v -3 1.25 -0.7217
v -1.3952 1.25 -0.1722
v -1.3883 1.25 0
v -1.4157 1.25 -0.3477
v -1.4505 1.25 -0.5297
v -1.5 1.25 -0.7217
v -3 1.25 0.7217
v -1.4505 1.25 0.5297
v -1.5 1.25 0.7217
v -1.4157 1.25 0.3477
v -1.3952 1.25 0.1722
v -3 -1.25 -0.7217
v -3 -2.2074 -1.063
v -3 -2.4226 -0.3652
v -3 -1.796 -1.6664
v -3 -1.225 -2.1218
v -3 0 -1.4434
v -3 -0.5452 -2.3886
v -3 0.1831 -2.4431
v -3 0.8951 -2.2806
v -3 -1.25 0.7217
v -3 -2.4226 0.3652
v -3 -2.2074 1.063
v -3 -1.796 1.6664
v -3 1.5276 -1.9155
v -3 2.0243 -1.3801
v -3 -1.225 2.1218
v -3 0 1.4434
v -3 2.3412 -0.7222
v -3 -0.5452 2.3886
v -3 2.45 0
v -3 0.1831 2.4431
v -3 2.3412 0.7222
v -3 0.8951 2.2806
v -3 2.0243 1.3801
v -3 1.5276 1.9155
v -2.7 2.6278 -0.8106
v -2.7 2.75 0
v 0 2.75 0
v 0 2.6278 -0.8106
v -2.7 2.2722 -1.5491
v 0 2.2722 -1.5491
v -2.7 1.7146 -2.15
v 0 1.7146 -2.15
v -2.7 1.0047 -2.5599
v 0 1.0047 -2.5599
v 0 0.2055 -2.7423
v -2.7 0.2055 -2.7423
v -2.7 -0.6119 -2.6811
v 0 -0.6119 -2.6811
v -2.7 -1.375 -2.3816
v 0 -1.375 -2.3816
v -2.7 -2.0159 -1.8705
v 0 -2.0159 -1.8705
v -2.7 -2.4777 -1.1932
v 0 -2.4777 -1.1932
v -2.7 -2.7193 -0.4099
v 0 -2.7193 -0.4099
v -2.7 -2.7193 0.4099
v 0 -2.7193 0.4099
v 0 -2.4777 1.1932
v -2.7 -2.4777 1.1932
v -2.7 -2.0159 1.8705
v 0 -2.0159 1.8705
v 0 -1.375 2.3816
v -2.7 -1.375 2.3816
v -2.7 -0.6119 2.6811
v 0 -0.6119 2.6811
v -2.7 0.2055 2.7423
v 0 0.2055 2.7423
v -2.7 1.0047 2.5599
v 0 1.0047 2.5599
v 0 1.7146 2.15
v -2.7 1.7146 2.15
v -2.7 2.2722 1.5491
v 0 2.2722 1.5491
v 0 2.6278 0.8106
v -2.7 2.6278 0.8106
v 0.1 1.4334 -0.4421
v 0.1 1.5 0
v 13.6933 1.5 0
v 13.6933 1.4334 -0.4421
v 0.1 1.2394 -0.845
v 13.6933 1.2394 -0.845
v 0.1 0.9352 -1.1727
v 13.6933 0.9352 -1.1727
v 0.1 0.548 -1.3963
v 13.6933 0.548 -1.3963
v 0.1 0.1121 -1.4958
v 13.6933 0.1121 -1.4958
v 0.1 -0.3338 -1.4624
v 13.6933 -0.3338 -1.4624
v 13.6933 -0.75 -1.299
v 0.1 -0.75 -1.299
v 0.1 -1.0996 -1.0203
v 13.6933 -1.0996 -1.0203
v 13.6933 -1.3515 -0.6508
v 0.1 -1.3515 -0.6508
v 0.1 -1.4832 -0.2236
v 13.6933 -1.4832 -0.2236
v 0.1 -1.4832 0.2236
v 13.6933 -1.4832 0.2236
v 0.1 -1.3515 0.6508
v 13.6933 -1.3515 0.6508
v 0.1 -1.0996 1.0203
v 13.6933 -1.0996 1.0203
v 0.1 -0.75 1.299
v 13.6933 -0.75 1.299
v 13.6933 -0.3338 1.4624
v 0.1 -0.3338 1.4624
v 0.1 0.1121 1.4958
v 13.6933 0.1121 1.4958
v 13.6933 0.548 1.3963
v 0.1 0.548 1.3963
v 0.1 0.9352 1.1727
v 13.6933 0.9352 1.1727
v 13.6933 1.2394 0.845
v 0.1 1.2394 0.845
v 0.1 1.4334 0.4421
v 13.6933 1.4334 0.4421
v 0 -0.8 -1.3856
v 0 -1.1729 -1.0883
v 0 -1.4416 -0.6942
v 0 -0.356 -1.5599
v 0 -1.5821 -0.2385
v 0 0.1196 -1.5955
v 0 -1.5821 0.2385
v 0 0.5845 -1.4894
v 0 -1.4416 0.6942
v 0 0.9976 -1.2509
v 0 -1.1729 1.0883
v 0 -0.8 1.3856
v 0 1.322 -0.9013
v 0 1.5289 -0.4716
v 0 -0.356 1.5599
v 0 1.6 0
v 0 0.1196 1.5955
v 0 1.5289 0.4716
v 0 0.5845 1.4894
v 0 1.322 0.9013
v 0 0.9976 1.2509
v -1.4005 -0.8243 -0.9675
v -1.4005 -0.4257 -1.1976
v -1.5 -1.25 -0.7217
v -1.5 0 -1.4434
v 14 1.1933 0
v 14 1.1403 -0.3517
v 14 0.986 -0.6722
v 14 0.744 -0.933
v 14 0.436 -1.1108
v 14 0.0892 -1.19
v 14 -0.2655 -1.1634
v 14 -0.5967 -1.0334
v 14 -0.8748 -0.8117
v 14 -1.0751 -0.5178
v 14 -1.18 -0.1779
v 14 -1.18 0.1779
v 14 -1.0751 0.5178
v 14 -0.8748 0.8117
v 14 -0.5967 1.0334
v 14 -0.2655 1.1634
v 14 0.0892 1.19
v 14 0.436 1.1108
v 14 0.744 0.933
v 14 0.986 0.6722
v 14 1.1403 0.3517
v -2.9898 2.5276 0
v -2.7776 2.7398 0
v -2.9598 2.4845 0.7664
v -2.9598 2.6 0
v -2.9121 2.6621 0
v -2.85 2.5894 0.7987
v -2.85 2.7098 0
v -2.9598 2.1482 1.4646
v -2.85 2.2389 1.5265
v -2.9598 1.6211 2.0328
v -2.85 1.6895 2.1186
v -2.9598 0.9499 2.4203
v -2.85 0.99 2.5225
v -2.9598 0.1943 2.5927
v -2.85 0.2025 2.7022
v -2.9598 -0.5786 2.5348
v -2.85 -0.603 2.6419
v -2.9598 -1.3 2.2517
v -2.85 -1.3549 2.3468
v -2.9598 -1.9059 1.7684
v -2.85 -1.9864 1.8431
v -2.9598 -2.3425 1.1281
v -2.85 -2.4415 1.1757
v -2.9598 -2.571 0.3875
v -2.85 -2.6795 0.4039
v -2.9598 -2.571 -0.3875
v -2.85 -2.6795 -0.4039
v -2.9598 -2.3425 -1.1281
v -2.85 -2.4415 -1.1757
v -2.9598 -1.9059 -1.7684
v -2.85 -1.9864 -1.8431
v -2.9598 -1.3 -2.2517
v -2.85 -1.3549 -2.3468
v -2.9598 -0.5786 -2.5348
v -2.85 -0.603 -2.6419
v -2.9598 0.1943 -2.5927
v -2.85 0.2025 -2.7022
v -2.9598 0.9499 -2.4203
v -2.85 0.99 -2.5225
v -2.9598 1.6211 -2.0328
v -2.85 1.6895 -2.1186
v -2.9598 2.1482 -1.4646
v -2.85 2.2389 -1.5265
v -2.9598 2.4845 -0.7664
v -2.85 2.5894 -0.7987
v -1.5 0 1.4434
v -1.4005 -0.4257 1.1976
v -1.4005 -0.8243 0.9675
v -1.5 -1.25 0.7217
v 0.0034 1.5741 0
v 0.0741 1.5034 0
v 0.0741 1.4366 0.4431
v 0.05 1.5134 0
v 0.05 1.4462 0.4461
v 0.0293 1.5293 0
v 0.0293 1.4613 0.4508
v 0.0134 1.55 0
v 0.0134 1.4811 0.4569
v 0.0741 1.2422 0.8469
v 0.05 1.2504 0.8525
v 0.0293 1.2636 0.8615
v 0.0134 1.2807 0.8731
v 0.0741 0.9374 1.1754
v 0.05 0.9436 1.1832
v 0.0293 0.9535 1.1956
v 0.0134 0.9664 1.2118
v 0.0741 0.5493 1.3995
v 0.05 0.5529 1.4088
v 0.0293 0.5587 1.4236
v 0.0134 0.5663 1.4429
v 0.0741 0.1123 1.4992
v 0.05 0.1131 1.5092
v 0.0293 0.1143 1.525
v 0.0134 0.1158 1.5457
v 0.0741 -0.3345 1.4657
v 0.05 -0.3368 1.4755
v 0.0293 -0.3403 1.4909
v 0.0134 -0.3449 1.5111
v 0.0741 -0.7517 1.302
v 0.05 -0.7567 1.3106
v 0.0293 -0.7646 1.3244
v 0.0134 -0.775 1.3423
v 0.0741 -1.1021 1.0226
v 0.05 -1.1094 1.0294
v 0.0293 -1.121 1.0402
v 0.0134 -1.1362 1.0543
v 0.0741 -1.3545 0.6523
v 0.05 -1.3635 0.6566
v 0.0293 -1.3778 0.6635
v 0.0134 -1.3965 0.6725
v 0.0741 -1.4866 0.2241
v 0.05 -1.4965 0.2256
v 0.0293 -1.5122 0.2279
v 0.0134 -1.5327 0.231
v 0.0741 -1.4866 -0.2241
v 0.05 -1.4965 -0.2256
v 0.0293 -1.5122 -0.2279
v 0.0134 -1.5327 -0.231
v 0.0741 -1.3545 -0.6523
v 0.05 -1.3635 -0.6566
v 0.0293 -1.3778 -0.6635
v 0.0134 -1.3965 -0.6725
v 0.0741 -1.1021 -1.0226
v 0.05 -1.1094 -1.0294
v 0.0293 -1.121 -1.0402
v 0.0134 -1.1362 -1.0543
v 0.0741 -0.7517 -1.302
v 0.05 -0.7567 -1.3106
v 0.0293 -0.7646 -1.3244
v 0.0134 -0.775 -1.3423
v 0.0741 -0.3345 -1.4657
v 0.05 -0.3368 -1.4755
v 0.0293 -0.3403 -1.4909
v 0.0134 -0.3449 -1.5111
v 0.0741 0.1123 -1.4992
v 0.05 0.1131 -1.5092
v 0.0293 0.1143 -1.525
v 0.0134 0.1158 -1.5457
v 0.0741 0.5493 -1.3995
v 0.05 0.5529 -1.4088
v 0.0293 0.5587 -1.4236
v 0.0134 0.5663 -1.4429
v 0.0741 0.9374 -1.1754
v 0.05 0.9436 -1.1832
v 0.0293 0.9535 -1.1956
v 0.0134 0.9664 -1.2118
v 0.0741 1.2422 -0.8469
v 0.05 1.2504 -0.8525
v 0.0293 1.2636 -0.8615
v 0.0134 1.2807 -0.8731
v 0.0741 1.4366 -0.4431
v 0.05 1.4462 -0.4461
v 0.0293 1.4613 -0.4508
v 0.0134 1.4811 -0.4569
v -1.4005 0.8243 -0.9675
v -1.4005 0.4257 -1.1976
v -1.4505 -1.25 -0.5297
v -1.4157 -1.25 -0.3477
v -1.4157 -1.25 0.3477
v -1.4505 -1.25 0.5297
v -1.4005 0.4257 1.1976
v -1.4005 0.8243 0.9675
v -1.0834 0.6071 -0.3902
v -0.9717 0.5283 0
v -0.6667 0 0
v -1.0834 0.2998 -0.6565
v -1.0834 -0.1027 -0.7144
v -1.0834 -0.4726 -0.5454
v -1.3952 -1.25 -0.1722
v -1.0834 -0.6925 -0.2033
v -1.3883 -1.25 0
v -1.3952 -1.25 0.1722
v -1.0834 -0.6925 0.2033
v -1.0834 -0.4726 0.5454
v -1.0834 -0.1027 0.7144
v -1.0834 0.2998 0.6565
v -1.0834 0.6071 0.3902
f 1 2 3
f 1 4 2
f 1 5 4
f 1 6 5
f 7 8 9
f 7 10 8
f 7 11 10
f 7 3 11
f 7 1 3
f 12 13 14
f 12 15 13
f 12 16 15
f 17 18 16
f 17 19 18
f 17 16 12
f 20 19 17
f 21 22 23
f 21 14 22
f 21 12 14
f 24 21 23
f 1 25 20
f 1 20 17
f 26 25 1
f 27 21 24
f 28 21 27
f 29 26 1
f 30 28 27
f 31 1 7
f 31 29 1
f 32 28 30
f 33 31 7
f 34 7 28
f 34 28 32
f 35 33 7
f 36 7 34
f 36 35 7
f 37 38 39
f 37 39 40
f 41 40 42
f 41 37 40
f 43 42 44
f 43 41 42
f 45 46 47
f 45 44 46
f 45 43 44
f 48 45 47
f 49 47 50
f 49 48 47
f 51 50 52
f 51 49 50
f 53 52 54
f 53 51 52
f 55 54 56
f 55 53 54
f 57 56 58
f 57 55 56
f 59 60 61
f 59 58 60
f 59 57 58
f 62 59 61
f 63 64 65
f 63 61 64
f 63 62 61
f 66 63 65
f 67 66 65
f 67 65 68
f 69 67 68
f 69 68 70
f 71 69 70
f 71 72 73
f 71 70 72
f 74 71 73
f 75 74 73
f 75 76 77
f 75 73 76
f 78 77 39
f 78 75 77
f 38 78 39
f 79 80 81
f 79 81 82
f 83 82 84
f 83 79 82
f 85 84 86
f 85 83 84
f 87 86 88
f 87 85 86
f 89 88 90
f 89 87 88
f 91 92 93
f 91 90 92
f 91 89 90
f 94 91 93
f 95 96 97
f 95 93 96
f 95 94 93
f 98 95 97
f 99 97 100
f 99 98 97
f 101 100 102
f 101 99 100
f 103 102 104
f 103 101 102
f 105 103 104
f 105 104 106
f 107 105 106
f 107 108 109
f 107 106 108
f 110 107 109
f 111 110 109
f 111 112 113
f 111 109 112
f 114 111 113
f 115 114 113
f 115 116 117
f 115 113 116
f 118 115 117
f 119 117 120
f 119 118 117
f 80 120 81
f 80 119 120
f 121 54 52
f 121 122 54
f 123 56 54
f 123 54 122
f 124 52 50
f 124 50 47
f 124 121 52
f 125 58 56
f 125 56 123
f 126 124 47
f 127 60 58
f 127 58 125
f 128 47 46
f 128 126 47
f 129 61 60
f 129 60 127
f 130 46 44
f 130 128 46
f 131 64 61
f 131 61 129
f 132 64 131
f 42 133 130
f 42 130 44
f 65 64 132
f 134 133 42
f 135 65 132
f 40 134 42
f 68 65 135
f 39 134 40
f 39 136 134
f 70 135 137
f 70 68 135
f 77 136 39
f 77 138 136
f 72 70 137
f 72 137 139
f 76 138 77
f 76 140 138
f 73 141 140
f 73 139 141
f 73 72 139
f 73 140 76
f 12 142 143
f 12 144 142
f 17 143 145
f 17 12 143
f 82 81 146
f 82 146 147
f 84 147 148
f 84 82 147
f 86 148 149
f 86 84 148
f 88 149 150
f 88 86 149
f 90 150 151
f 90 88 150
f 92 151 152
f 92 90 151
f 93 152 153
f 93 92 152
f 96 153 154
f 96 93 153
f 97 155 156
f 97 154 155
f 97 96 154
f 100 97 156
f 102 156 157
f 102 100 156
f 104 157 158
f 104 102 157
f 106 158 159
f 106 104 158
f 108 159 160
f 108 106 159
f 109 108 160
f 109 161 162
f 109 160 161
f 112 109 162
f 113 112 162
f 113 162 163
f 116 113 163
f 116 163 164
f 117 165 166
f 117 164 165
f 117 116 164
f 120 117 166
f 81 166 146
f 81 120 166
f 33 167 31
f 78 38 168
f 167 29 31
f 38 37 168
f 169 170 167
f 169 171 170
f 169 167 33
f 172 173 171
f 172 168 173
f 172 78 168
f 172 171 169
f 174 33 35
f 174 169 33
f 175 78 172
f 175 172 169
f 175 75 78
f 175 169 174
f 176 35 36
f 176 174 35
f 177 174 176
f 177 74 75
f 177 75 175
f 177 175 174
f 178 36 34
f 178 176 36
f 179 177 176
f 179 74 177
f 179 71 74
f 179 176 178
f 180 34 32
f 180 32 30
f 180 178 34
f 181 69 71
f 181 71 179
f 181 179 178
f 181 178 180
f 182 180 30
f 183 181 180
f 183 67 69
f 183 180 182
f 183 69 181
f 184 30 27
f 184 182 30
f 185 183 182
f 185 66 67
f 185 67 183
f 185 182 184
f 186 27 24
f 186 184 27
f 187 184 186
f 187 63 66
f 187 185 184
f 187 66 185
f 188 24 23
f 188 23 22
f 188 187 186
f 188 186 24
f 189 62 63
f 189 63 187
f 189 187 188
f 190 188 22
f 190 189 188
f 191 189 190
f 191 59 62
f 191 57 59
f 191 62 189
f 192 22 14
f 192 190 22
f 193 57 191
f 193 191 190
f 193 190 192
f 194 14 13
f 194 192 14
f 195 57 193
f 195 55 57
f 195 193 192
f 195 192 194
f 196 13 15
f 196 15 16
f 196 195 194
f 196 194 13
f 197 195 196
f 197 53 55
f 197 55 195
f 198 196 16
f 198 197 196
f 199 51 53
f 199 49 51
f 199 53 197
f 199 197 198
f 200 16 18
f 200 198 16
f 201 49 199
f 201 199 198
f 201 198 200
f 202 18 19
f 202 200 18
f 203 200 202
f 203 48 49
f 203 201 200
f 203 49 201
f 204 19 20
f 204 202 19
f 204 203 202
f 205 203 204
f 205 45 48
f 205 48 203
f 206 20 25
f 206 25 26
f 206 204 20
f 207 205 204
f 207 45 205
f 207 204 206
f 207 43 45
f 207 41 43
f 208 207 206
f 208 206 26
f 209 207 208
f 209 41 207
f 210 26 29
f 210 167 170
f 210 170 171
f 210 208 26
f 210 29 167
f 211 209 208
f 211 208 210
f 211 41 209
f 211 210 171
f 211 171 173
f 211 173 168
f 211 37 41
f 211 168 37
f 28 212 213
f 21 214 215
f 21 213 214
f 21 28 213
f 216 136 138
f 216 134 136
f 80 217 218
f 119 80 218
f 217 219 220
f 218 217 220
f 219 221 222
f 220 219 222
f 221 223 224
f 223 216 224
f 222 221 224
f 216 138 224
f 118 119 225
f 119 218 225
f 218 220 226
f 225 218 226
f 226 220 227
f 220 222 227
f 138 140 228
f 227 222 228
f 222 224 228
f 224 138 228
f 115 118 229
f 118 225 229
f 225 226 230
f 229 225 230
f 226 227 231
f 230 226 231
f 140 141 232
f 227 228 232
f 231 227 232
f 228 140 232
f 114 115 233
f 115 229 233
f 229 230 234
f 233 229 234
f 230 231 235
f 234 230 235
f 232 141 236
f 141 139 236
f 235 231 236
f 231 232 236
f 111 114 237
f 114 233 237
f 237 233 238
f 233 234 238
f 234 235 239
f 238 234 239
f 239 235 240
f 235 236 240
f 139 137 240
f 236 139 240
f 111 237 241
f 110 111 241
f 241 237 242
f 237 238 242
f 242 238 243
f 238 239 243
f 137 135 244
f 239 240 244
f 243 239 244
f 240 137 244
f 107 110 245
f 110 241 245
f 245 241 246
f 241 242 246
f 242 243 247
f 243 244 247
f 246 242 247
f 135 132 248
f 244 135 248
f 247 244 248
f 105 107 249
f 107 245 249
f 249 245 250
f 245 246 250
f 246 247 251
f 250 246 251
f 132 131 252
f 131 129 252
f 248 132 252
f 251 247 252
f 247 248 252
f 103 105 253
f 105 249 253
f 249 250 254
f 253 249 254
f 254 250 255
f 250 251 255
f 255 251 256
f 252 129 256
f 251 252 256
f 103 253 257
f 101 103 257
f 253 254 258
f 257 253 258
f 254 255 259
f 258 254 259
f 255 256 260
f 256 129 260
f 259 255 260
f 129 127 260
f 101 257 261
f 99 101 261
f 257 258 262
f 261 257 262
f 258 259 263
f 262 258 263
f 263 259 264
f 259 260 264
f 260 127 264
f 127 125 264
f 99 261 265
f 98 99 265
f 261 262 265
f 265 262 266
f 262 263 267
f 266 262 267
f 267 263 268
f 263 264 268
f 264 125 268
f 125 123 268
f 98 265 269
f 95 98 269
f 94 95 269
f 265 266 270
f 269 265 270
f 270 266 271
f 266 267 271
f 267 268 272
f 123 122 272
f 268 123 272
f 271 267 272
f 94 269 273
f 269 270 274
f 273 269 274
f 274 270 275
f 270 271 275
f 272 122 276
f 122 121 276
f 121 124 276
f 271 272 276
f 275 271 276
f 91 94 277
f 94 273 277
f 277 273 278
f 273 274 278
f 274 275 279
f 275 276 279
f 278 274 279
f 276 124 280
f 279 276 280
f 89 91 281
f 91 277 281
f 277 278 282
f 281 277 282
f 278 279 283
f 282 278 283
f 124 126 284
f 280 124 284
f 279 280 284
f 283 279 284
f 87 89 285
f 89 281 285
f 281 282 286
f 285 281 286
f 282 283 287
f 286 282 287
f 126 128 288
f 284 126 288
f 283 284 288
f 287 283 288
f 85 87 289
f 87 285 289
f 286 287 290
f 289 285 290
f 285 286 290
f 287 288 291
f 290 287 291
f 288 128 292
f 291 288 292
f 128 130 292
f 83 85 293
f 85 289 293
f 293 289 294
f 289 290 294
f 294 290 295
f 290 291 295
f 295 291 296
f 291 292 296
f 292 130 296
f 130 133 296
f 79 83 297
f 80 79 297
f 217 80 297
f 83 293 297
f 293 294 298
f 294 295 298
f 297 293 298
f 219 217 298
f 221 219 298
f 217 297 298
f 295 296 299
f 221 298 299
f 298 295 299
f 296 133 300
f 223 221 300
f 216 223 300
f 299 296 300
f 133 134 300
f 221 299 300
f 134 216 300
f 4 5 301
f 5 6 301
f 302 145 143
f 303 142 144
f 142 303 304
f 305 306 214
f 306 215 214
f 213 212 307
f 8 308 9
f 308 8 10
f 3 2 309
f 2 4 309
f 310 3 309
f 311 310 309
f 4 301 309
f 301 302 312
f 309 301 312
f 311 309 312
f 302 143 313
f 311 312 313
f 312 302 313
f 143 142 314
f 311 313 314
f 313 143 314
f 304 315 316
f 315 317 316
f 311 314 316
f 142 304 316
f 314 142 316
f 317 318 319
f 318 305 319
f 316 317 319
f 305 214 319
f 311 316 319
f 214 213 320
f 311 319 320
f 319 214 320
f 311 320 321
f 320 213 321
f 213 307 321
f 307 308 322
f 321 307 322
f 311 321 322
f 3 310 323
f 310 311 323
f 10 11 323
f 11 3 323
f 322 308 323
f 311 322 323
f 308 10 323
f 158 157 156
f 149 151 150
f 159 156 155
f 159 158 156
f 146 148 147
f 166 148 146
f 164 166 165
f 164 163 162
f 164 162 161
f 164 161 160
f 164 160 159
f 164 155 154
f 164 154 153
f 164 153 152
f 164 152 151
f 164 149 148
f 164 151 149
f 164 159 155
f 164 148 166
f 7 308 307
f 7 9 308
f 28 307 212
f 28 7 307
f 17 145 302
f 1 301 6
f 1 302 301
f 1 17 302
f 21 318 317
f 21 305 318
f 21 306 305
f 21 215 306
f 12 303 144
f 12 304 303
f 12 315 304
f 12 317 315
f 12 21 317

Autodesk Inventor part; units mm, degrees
ref_plane "YZ Plane" through (0, 0, 0) normal (1, 0, 0) x (0, 1, 0)
ref_plane "XZ Plane" through (0, 0, 0) normal (0, 1, 0) x (-1, 0, 0)
sketch "Sketch1" plane through (0, 0, 0) normal (0, 0, 1) x (1, 0, 0)
  line L0 (-0.6667, 0) -> (14, 0)
  line L1 (14, 0) -> (14, 1.5)
  line L2 (14, 1.5) -> (1, 1.5)
  line L3 (1, 1.5) -> (0.6932, 1.5)
  line L4 (0.6932, 1.5) -> (0, 1.5)
  line L5 (0, 1.5) -> (0, 2.75)
  line L6 (0, 2.75) -> (-3, 2.75)
  line L7 (-3, 2.75) -> (-3, 1.4434)
  line L8 (-3, 1.4434) -> (-1.5, 1.4434)
  line L9 (-1.5, 1.4434) -> (-0.6667, 0)
  line L10 (-6.8, 0) -> (19.8, 0) projected
  line L11 (0, -0.55) -> (0, 3.3) projected
  line L12 (1, 1.5) -> (0, 1.5) construction
  dimension "d1" = 13
  dimension "d2" = 0.3068
  dimension "d3" = 3
  dimension "d4" = 1.5
  dimension "d5" = 60
  dimension "d6" = 3
  dimension "d7" = 3
  dimension "d8" = 2.8868
  dimension "d9" = 5.5
  dimension "d26" = 14
revolve "Body" add sketch "Sketch1" angle 360 about axis through (-0.6667, 0, 0) along (1, 0, 0)
sketch "Sketch2" plane through (-3, 0, 0) normal (-1, 0, 0) x (0, 0, 1)
  circle A0 centre (0, 0) radius 1.4434 projected
  line L0 (0, -3.85) -> (0, 3.85) projected
  line L1 (-3.85, 0) -> (3.85, 0) projected
  line L2 (1.4434, 0) -> (0.7217, -1.25)
  line L3 (0.7217, -1.25) -> (-0.7217, -1.25)
  line L4 (-0.7217, -1.25) -> (-1.4434, 0)
  line L5 (-1.4434, 0) -> (-0.7217, 1.25)
  line L6 (-0.7217, 1.25) -> (0.7217, 1.25)
  line L7 (0.7217, 1.25) -> (1.4434, 0)
extrude "Slot" add sketch "Sketch2" against normal up to next contours L7 A0 | A0 L2 | L6 L0 A0 | A0 L0 L3 | L0 L6 A0 | A0 L3 L0 | L4 A0 | A0 L5
fillet "Fillet1" radius 0.3 1 edges at (-3, -2.75, 0)
thread "Thread" size "M3x0.5" class "6g" standard "ISO Metric profile" length 13
chamfer "Chamfer1" distance 0.3067 distance2 0.3067 1 edges at (14, -1.5, 0) measured on face at (14, 0.5539, 0.4443)
ref_plane "Work Plane1" through (29, 0, 0) normal (0, -1, 0) x (1, 0, 0)
fillet "Fillet2" radius 0.1 1 edges at (0, -1.5, 0)
equation "\"d1\" = GEL"
equation "\"d3\" = KOH"
equation "\"d4\" = INTI"
equation "\"d6\" = GD"
equation "\"d7\" = BDM"
equation "\"d8\" = 1.1547 * SW"
equation "\"d9\" = KOD"
equation "\"d26\" = NLG"
equation "\"d30\" = R"
equation "\"d17\" = RR"
equation "\"d13\" = GEL"
equation "\"d15\" = -0.5 * SPD + 0.5 * GD"
equation "\"d16\" = GUL"
equation "\"GD\" = NND"
equation "\"NLG\" = 14"
equation "\"GEL\" = 13"
equation "\"KOD\" = 5.5"
equation "\"KOH\" = 3"
equation "\"INTI\" = 1.5"
equation "\"GAL\" = 0.61345 * PTC"
equation "\"GUL\" = 0.61345 * PTC"
equation "\"BDM\" = NND"
equation "\"SW\" = 2.5"
equation "\"RR\" = 0.3"
equation "\"SPD\" = 2.38655"
equation "\"R\" = 0.1"
equation "\"TOA\" = 30deg"
equation "\"THREADDIA\" = 3"
equation "\"PTC\" = 0.5"
equation "\"NND\" = 3"
equation "\"E0\" = 1.155 * SW"
equation "\"GD1\" = THREADDIA - 1.2269 * PTC"
properties material "Steel, Mild"
